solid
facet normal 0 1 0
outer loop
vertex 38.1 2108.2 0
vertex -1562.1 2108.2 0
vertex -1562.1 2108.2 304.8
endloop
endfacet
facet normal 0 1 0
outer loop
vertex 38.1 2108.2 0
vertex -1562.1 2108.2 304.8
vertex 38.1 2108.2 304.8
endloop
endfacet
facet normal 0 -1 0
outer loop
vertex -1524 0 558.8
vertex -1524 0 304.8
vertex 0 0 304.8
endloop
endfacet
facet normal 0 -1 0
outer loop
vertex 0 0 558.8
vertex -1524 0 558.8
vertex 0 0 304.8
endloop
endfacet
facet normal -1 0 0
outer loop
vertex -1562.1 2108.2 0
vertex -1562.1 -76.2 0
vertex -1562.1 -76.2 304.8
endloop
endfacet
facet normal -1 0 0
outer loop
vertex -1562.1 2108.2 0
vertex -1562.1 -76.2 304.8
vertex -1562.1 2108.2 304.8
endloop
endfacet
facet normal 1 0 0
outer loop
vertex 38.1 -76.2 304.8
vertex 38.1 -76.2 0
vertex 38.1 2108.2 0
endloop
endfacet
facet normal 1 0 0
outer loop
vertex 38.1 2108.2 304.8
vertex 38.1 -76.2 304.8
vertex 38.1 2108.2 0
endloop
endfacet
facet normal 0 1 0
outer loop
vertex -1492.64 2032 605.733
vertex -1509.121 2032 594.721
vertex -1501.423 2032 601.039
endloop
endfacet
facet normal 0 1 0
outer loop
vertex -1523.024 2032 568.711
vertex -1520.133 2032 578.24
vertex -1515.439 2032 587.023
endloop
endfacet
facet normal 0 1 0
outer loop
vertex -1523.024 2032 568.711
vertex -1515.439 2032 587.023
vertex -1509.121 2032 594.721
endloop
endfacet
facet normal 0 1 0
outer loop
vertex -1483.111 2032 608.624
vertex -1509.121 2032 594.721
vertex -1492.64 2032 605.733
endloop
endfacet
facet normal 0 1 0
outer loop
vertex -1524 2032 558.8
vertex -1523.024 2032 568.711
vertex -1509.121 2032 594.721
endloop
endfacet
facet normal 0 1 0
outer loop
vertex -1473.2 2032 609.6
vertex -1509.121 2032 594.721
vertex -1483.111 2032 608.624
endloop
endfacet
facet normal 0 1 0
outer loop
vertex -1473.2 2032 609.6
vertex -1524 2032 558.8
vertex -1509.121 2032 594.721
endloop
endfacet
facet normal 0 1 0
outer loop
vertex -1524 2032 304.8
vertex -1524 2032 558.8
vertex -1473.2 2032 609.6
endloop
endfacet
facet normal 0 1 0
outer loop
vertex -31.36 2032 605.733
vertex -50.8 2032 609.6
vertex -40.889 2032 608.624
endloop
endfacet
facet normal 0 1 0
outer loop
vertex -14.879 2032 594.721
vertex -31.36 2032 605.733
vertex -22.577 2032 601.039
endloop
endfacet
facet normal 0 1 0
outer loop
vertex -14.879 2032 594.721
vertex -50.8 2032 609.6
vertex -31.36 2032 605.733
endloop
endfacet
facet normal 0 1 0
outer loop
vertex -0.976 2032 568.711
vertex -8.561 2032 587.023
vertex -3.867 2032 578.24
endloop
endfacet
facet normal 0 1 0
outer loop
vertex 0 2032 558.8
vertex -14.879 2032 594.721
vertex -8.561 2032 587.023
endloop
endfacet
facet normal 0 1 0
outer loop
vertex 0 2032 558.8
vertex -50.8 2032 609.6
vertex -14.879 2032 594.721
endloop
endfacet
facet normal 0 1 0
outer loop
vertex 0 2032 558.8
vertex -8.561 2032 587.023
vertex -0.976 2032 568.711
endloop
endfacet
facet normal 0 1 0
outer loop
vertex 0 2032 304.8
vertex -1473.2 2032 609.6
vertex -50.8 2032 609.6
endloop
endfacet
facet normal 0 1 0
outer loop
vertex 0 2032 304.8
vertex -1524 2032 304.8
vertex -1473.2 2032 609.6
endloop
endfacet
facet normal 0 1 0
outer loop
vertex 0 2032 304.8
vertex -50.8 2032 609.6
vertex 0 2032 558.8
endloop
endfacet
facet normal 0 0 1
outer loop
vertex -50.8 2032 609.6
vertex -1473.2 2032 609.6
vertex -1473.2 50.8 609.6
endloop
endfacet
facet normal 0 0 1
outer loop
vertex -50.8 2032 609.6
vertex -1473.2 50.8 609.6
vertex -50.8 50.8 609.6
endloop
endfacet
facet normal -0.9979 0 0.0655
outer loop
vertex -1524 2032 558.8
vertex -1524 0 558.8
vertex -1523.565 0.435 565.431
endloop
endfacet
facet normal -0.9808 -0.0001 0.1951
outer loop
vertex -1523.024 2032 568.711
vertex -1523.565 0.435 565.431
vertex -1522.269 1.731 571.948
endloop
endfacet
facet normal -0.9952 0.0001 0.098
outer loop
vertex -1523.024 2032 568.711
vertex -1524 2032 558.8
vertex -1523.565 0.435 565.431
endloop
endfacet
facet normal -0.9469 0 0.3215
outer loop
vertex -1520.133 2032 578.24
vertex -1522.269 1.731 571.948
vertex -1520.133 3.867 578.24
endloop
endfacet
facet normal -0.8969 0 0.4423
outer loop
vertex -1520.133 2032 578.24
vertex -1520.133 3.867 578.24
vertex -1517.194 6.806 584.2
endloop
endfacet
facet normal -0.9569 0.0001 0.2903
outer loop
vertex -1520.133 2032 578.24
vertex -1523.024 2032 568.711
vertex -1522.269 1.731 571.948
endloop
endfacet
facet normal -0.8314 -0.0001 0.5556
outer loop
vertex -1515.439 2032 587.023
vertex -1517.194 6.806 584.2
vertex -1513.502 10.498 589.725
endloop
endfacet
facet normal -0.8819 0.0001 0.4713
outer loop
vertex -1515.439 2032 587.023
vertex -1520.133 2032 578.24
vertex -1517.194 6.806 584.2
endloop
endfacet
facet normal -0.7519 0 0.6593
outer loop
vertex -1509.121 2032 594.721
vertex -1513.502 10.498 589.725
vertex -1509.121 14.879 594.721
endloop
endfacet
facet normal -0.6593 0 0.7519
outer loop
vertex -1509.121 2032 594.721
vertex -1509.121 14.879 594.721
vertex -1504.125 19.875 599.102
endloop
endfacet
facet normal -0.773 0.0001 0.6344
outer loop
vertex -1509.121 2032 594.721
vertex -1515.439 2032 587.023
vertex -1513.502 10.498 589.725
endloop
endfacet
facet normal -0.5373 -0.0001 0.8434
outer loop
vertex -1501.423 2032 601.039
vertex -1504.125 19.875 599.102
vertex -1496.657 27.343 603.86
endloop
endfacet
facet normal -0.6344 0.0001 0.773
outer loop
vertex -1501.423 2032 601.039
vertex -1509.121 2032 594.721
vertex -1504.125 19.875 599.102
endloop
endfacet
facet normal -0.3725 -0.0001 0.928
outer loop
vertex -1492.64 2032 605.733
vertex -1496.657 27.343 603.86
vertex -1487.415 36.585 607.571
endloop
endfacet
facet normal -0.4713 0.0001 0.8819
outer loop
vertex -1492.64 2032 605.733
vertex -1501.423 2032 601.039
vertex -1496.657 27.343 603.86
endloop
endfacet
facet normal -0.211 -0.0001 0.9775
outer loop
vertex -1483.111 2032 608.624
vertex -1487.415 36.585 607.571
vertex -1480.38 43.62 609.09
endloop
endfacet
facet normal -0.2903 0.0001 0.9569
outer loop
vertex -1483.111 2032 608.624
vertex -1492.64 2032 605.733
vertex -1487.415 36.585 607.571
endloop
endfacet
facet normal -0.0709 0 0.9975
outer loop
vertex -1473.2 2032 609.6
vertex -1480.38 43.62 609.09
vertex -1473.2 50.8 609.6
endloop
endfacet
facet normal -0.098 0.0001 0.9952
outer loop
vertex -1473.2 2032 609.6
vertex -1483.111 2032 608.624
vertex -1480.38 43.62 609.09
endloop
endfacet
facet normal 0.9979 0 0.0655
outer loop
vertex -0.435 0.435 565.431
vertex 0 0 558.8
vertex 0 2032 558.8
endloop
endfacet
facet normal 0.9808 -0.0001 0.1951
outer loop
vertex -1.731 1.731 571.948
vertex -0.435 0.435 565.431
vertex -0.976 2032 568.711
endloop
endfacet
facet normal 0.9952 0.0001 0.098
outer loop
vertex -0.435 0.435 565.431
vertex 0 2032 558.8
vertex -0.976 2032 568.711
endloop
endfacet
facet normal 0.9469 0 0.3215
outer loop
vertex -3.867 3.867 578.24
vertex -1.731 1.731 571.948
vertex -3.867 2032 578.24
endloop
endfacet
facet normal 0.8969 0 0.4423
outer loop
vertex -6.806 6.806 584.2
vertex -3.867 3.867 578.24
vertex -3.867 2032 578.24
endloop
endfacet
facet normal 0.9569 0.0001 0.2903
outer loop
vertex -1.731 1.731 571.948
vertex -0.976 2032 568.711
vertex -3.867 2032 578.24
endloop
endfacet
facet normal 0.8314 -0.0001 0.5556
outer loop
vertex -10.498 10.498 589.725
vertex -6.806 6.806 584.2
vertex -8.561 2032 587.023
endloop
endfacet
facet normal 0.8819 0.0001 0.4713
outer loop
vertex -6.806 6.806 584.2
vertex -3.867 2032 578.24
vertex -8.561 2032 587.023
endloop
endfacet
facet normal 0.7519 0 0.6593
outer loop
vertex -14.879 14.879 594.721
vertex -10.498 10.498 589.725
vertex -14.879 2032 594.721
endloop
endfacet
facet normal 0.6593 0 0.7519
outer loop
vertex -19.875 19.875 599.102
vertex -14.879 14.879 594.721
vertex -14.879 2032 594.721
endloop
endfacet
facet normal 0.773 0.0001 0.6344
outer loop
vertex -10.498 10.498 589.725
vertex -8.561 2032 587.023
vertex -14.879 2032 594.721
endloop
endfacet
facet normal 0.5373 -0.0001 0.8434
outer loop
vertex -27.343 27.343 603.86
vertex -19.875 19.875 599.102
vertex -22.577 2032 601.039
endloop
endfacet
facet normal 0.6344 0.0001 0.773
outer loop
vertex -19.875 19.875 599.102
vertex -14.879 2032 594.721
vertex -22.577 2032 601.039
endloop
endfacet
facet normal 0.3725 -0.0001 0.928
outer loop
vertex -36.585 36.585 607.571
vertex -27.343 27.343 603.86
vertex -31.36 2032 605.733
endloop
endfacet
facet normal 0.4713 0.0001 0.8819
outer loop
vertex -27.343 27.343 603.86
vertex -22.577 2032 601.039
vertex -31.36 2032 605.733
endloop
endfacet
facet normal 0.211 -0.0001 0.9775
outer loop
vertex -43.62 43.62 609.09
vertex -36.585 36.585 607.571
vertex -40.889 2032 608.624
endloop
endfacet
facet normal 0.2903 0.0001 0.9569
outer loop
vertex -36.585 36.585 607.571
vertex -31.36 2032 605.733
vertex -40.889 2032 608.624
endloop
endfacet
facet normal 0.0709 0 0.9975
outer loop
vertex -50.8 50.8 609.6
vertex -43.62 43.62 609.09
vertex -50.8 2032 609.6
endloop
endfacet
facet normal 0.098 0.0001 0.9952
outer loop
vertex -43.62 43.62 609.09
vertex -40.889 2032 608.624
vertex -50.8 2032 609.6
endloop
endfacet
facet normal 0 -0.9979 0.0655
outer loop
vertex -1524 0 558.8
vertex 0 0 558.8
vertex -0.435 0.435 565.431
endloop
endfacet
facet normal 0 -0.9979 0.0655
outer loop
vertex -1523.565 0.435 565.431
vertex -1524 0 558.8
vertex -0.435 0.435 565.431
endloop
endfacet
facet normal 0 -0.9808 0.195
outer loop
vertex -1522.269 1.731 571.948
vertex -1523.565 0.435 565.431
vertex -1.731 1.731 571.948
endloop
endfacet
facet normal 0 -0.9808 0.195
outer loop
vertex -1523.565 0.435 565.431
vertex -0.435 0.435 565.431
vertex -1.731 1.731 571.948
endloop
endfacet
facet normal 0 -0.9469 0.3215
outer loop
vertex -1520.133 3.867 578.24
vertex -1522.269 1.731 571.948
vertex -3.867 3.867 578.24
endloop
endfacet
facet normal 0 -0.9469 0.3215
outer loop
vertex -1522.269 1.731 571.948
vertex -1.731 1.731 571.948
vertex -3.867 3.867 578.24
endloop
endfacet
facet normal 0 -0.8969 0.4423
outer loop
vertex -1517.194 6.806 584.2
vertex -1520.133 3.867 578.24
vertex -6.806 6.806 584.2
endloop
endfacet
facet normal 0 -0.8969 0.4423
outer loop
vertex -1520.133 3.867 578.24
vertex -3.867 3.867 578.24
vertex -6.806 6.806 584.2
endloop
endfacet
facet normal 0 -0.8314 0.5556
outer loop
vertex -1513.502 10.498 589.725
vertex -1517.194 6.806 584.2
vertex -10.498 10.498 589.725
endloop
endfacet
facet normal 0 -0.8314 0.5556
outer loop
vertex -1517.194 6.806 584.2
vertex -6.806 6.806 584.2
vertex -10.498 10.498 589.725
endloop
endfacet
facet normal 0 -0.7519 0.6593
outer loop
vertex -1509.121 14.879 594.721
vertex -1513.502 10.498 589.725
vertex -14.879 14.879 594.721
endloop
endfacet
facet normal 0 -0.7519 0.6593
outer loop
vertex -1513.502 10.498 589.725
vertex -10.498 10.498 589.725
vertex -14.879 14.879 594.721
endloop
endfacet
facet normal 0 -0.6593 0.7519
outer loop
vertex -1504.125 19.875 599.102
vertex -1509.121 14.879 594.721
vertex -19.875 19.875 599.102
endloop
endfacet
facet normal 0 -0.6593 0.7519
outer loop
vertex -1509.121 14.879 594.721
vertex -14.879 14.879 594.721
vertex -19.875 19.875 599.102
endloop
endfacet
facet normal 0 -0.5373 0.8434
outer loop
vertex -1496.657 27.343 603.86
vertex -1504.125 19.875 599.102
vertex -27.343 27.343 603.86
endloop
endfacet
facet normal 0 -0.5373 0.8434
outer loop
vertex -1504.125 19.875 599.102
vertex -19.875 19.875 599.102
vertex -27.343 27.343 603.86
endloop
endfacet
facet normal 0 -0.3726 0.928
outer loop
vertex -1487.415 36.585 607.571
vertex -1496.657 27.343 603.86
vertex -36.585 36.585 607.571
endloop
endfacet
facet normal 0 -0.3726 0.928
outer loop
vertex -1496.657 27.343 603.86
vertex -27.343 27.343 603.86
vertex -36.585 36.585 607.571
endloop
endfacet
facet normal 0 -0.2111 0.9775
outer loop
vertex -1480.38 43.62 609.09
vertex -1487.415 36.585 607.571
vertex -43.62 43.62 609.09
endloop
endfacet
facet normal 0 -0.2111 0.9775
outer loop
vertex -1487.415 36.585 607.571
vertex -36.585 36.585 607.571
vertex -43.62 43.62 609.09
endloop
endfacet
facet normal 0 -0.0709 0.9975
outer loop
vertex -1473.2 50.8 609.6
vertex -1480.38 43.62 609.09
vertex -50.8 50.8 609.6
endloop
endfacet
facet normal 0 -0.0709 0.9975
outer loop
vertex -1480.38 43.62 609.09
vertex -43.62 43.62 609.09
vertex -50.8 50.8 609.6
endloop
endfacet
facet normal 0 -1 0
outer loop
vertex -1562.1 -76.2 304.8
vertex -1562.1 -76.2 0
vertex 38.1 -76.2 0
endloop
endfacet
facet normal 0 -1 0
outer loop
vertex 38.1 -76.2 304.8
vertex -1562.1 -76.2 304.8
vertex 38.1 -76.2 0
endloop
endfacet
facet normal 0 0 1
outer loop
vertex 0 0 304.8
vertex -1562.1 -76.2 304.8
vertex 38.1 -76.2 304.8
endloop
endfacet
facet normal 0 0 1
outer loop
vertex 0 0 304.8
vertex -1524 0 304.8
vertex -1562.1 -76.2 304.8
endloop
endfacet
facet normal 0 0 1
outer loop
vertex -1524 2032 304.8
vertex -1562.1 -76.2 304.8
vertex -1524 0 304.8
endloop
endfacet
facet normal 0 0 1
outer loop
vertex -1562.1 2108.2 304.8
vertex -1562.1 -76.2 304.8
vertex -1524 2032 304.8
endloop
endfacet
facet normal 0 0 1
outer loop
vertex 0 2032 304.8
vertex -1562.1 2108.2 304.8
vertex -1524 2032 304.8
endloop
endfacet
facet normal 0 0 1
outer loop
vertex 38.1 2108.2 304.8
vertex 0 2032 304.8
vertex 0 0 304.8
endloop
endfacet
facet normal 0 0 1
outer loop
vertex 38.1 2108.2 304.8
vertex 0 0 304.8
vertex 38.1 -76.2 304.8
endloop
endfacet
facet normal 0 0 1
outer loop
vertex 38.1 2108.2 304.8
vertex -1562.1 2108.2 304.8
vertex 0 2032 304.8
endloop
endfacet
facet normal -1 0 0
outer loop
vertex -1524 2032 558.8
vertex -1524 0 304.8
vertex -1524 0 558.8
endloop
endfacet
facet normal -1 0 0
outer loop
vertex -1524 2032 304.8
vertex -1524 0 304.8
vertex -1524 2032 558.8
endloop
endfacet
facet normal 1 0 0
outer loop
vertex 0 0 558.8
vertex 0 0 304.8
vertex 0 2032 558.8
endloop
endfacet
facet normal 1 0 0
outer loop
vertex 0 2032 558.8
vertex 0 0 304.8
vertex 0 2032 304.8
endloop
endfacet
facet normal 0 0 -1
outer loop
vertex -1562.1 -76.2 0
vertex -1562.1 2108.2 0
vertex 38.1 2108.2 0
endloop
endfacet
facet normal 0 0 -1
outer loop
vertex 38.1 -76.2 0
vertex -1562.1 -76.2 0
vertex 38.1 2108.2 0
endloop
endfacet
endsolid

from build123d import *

# Parameters (mm, degrees)
F0_W     = 1524
F0_H     = 2032
F1_DEPTH = 609.6
F2_R     = 50.8
F3_W     = 1600.2
F3_H     = 2184.4
F4_DEPTH = 304.8


with BuildPart() as f1:
    # F0 (on Top) → F1 (new body)
    with BuildSketch(Plane.XY):
        with Locations((-762, 1016)):
            Rectangle(F0_W, F0_H)
    extrude(amount=F1_DEPTH)

    # F2
    f2_edges = [f1.edges().sort_by_distance(p)[0] for p in [
        (-762, 0, 609.6),
        (-1524, 1016, 609.6),
        (0, 1016, 609.6),
    ]]
    fillet(f2_edges, radius=F2_R)

    # F3 (on Top) → F4 (join)
    with BuildSketch(Plane.XY):
        with Locations((-762, 1016)):
            Rectangle(F3_W, F3_H)
    extrude(amount=F4_DEPTH)


solid = f1.part
